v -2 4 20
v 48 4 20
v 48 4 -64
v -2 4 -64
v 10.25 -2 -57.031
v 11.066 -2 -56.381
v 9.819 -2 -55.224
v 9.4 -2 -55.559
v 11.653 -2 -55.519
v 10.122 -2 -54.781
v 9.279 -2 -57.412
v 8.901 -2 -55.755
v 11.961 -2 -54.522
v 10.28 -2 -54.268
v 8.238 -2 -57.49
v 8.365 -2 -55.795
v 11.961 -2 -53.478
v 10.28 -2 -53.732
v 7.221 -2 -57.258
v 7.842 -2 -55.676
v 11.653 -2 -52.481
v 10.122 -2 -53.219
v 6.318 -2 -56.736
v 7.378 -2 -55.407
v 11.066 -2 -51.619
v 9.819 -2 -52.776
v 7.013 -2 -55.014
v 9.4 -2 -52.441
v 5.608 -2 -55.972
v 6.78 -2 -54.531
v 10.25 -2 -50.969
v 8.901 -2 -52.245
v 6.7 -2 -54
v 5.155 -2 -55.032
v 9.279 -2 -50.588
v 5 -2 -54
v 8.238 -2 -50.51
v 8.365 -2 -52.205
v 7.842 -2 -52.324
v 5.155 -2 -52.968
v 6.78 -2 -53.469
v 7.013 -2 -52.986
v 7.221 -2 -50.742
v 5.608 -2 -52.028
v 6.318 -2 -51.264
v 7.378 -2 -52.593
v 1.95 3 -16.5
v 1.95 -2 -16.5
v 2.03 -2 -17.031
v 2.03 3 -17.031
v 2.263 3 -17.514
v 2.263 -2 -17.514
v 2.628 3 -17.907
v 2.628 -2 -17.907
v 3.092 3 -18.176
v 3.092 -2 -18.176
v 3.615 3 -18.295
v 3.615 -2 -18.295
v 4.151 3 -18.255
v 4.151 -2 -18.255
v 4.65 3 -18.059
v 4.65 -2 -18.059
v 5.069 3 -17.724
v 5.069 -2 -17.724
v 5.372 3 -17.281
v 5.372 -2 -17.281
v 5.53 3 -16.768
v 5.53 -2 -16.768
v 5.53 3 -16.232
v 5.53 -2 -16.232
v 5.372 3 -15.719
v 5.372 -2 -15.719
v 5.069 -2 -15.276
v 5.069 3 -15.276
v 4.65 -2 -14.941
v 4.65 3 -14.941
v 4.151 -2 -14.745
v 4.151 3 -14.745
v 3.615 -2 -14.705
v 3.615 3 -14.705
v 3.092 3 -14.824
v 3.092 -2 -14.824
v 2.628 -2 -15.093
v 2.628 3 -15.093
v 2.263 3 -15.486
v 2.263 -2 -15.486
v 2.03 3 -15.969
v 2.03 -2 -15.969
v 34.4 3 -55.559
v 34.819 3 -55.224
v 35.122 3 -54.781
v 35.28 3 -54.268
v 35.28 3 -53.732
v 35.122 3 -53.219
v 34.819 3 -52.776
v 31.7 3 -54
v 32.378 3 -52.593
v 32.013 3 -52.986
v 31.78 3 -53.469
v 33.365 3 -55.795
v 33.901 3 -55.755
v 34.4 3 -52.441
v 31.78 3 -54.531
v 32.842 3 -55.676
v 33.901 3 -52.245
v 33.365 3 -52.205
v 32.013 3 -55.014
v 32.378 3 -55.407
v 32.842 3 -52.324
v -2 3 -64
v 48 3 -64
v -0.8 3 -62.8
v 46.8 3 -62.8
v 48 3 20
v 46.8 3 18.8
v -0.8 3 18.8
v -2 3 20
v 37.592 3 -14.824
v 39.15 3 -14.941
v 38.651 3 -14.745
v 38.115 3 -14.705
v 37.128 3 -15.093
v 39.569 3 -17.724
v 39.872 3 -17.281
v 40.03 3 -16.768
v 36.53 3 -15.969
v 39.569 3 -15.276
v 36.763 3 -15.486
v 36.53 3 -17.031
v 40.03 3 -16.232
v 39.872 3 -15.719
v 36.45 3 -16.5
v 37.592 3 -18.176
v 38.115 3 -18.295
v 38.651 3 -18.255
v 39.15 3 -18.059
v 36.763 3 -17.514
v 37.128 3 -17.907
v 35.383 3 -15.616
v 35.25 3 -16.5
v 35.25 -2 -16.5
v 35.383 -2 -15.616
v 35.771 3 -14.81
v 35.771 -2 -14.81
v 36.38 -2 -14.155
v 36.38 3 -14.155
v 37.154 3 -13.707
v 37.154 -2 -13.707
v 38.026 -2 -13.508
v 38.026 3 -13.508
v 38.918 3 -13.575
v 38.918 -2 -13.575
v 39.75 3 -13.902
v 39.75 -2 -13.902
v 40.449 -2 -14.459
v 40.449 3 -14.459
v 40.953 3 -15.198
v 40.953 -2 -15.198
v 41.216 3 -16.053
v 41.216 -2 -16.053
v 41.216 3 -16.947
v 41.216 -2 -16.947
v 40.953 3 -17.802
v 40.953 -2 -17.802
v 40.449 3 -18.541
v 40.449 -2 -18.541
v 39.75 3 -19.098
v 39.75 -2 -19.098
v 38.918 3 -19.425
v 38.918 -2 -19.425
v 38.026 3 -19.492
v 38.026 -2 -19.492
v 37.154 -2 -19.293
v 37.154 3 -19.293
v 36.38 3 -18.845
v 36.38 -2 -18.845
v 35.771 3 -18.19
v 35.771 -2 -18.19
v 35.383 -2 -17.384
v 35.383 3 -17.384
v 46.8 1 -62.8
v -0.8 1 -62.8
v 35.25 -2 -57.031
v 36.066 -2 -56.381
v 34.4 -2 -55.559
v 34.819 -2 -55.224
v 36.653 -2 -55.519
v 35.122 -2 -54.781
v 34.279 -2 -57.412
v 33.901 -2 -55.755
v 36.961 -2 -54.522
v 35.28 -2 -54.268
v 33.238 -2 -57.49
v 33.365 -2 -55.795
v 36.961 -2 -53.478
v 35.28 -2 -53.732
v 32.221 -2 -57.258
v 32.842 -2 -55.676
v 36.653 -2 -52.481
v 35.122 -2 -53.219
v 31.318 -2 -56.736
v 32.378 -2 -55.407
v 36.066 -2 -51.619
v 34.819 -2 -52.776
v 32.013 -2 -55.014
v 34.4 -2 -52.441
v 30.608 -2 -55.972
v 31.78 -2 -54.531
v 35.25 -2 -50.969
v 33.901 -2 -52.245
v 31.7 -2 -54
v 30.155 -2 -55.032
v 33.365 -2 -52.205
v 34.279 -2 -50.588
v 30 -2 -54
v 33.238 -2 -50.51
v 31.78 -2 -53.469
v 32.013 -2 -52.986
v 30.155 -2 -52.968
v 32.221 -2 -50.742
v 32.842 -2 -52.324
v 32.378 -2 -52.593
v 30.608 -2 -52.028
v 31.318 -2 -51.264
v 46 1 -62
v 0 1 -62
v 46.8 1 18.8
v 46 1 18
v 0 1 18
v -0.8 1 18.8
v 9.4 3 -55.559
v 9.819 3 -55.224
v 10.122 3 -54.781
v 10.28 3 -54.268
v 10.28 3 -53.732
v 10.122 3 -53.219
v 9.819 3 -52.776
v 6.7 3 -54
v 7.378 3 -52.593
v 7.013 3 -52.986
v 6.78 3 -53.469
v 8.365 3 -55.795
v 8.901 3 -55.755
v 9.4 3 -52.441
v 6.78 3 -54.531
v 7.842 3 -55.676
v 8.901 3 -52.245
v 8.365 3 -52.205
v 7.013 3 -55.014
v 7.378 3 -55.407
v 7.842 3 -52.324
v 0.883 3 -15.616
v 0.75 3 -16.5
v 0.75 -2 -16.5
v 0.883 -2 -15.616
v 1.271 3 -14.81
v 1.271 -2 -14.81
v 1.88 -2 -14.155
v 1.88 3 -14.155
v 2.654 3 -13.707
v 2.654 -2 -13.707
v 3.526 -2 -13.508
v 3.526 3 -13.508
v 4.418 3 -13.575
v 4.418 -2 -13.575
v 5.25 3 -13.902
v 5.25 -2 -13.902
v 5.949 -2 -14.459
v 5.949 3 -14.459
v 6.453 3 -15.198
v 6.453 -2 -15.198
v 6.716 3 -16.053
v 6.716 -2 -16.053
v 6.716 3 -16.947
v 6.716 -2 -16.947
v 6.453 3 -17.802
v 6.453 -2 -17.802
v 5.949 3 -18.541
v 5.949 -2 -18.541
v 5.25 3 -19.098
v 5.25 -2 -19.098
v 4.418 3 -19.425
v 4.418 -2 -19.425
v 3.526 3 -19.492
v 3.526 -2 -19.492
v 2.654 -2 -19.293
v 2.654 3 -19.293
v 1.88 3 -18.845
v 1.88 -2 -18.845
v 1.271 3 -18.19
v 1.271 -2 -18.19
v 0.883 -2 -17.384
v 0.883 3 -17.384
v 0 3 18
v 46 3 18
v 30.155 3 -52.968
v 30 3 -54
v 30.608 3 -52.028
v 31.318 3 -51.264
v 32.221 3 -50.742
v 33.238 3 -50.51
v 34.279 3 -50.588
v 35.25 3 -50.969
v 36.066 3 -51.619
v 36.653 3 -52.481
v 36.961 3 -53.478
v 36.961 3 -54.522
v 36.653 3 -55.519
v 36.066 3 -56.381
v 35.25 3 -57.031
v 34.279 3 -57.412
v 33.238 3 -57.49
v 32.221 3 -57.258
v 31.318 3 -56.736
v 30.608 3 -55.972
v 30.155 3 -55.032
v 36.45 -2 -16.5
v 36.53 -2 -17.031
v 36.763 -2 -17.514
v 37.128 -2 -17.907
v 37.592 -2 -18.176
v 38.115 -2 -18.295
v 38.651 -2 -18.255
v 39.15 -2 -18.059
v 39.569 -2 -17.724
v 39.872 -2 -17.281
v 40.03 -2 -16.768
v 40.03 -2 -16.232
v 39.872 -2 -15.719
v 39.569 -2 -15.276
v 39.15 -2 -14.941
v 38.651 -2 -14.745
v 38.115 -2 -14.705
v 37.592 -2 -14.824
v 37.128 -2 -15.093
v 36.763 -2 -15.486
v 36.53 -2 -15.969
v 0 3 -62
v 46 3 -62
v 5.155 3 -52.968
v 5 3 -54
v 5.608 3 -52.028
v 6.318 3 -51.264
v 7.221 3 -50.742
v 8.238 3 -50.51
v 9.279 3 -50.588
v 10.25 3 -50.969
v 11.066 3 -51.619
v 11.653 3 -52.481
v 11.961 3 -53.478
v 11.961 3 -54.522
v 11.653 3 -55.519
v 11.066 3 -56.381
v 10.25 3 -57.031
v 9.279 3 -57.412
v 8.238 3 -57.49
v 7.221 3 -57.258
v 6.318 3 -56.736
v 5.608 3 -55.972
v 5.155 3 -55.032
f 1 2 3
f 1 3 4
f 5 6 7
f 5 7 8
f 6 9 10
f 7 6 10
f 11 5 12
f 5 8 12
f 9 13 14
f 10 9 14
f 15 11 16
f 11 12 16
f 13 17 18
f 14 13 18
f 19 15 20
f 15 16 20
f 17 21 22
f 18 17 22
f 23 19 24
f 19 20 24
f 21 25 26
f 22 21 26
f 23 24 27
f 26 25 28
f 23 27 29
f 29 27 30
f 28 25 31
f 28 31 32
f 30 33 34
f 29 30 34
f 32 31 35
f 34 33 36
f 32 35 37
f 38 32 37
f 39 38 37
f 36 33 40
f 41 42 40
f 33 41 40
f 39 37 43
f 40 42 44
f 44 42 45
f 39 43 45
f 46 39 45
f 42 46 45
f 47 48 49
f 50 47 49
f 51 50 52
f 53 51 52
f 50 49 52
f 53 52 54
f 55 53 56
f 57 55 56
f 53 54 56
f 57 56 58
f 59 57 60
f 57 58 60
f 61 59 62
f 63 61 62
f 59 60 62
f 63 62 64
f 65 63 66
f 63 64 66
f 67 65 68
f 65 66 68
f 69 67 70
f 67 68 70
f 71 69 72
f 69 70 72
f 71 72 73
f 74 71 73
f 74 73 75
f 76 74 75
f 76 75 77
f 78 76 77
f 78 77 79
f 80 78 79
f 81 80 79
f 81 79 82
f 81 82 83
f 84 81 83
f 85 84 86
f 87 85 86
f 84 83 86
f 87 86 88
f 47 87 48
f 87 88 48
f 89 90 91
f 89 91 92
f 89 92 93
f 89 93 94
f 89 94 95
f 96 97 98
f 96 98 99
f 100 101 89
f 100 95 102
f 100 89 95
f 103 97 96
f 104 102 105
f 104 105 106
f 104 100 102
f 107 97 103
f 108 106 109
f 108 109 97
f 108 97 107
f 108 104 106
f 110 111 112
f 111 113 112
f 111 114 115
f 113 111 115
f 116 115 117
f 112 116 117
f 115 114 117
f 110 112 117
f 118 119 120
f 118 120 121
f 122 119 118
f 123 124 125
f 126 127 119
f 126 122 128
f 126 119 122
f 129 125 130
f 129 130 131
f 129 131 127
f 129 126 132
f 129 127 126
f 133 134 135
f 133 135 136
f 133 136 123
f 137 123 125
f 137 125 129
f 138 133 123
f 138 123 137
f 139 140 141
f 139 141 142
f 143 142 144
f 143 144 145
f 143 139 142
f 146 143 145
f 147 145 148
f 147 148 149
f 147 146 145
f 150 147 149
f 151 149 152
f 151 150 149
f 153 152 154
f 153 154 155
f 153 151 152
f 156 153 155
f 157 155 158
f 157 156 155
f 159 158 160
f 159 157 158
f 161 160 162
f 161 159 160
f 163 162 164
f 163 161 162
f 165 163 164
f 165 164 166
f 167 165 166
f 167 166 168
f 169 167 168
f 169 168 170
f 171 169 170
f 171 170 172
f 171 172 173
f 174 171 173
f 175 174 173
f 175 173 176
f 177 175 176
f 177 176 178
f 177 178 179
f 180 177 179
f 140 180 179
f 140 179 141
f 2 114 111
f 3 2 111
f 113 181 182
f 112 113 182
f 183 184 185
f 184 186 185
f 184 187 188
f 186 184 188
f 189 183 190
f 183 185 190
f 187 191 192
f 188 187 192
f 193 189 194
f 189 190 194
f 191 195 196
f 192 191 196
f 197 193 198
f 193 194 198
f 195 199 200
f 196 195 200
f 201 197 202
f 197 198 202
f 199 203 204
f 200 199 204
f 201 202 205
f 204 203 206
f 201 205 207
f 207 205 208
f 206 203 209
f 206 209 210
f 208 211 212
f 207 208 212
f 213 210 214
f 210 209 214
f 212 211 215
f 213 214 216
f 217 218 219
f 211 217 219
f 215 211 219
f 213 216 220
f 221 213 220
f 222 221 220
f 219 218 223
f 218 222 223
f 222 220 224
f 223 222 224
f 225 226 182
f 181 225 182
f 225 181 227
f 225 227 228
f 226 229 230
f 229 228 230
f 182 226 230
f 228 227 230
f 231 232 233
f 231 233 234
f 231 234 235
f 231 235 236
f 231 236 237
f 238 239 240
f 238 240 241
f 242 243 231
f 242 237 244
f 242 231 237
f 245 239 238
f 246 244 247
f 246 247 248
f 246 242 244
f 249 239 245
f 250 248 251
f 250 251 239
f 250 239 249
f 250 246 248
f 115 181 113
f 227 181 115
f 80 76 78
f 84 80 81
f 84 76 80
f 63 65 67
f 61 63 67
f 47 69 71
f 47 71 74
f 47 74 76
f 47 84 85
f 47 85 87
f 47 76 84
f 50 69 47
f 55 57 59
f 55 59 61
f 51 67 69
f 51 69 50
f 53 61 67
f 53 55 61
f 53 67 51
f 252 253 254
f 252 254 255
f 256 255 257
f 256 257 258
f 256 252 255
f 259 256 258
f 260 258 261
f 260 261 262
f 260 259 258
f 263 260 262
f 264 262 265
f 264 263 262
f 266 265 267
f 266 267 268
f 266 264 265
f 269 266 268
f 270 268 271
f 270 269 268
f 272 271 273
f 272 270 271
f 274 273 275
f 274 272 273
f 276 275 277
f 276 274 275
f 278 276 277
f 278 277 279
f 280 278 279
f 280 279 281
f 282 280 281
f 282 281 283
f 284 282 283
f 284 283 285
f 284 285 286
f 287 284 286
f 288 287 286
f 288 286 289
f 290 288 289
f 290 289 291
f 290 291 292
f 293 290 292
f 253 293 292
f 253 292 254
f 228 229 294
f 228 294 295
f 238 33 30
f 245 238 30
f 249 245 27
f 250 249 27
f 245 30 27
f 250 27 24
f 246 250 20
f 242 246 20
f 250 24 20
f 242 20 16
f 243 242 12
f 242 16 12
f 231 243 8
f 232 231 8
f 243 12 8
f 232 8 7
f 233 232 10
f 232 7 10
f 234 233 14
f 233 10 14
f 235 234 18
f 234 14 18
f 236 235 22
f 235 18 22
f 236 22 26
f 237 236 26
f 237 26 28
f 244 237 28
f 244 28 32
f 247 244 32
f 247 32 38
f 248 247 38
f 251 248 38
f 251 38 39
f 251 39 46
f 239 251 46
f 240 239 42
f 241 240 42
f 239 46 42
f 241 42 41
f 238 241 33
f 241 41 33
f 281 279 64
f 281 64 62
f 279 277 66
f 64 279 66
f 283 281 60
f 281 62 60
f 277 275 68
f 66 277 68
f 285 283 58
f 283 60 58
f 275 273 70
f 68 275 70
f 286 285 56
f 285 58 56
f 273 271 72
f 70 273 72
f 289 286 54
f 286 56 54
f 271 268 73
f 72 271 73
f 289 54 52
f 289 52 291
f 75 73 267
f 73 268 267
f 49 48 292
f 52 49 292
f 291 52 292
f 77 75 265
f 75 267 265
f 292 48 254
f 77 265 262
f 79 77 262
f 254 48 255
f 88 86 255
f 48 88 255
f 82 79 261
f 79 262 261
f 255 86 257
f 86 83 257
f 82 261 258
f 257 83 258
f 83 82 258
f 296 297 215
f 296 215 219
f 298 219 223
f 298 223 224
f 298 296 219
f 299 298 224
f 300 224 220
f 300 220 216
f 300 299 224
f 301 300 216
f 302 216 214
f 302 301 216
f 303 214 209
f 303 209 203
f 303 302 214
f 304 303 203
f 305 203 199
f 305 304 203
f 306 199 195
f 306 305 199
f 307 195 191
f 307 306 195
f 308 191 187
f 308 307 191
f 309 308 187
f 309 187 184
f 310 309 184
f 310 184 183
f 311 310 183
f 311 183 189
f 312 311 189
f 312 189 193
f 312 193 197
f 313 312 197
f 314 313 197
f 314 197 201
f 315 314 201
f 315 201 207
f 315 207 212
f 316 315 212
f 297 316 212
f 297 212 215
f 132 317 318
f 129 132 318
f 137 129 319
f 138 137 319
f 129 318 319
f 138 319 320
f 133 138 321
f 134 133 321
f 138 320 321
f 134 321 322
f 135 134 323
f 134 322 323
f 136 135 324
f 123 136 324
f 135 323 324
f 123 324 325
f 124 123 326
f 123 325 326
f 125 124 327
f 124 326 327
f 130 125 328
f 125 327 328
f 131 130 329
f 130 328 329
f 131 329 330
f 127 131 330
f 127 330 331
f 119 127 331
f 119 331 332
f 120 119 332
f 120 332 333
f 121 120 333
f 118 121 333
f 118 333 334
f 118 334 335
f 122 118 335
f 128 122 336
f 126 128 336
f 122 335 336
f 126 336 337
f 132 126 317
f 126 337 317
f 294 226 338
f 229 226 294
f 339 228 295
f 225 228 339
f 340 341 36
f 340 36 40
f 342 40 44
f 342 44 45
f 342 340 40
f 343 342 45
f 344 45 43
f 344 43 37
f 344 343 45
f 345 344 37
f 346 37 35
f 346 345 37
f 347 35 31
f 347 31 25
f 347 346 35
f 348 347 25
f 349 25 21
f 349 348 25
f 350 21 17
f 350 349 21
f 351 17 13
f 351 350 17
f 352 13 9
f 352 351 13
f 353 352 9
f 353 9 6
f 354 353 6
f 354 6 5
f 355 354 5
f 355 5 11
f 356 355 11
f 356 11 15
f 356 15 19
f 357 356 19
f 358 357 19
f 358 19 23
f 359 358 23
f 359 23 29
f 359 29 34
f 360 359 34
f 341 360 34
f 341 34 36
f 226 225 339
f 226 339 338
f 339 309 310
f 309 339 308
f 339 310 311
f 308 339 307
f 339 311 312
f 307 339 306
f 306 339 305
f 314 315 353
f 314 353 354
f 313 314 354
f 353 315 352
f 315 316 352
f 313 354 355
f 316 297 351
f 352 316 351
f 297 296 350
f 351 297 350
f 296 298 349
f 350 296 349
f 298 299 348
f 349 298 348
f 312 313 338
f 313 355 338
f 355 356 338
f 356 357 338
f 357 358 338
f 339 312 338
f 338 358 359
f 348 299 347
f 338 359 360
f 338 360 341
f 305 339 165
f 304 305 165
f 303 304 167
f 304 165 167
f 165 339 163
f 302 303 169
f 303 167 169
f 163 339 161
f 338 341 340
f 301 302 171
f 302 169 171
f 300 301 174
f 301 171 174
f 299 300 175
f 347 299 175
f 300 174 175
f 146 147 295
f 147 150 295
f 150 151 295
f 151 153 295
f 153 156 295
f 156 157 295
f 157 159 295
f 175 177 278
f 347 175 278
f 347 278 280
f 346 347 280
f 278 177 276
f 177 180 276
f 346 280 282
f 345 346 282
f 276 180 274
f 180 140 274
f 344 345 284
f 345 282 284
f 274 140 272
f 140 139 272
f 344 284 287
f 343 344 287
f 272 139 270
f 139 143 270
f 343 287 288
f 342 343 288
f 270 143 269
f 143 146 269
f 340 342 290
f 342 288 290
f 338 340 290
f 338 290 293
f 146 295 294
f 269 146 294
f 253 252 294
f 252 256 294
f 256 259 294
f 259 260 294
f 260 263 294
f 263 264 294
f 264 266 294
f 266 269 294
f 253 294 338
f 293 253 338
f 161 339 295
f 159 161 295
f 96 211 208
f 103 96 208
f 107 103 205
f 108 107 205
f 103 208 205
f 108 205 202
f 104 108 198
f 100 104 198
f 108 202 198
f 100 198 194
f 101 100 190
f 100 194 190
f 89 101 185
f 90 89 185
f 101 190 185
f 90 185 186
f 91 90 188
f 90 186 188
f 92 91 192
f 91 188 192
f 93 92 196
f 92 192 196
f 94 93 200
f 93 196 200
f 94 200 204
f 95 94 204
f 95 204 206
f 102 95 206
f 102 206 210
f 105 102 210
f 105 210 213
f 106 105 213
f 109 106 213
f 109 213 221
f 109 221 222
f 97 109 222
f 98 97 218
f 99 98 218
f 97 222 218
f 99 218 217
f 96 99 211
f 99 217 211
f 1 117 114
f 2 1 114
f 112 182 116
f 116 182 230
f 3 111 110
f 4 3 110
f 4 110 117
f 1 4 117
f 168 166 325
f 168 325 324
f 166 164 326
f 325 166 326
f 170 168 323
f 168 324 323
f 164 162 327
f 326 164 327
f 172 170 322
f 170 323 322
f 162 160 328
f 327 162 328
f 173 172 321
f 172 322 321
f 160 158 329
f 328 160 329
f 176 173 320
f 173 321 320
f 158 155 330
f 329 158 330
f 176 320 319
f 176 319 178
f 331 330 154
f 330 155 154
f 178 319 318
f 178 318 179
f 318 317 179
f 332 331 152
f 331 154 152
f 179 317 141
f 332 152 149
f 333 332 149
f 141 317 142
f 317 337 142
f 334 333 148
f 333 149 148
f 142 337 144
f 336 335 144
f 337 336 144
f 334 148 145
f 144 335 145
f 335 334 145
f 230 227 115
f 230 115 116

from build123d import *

# Parameters (mm, degrees)
PAD_DEPTH       = 3
POCKET_DEPTH    = 2
SKETCH004_W     = 50
SKETCH004_H     = 84
SKETCH004_W_2   = 47.6
SKETCH004_H_2   = 81.6
POCKET001_DEPTH = 2
SKETCH005_R     = 3.5
SKETCH005_R_2   = 3
PAD001_DEPTH    = 6
SKETCH_R        = 1.8
POCKET002_DEPTH = 5


with BuildPart() as part:
    # Sketch002 → Pad (new body)
    with BuildSketch(Plane(origin=(0, 1, 0), x_dir=(-1, 0, 0), z_dir=(0, 1, 0))):
        Polygon((-44, -64), (2, -64), (2, 20), (-44, 20), (-48, 20), (-48, -64), align=None)
    extrude(amount=PAD_DEPTH)

    # Sketch003 → Pocket (cut)
    with BuildSketch(Plane(origin=(0, 1, 0), x_dir=(-1, 0, 0), z_dir=(0, 1, 0))):
        Polygon((-42, -62), (0, -62), (0, 18), (-42, 18), (-46, 18), (-46, -62), align=None)
    extrude(amount=POCKET_DEPTH, mode=Mode.SUBTRACT)

    # Sketch004 → Pocket001 (cut)
    with BuildSketch(Plane(origin=(0, 1, 0), x_dir=(-1, 0, 0), z_dir=(0, 1, 0))):
        with Locations((-23, -22)):
            Rectangle(SKETCH004_W, SKETCH004_H)
        with Locations((-23, -22)):
            Rectangle(SKETCH004_W_2, SKETCH004_H_2, mode=Mode.SUBTRACT)
    extrude(amount=POCKET001_DEPTH, mode=Mode.SUBTRACT)

    # Sketch005 (on Face4 of Pocket001) → Pad001 (join)
    with BuildSketch(Plane(origin=(0, 4, 0), x_dir=(-1, 0, 0), z_dir=(0, 1, 0))):
        with Locations((-33.499998, -54)):
            Circle(SKETCH005_R)
        with Locations((-8.499999, -53.999999)):
            Circle(SKETCH005_R)
        with Locations((-38.250001, -16.5)):
            Circle(SKETCH005_R_2)
        with Locations((-3.75, -16.5)):
            Circle(SKETCH005_R_2)
    extrude(amount=-PAD001_DEPTH)

    # Sketch (on Face30 of Pad001) → Pocket002 (cut)
    with BuildSketch(Plane(origin=(0, -2, 0), x_dir=(-1, 0, 0), z_dir=(0, -1, 0))):
        with Locations((-33.499998, 54)):
            Circle(SKETCH_R)
        with Locations((-8.499999, 53.999999)):
            Circle(SKETCH_R)
        with Locations((-38.250001, 16.5)):
            Circle(SKETCH_R)
        with Locations((-3.75, 16.5)):
            Circle(SKETCH_R)
    extrude(amount=-POCKET002_DEPTH, mode=Mode.SUBTRACT)


solid = part.part
